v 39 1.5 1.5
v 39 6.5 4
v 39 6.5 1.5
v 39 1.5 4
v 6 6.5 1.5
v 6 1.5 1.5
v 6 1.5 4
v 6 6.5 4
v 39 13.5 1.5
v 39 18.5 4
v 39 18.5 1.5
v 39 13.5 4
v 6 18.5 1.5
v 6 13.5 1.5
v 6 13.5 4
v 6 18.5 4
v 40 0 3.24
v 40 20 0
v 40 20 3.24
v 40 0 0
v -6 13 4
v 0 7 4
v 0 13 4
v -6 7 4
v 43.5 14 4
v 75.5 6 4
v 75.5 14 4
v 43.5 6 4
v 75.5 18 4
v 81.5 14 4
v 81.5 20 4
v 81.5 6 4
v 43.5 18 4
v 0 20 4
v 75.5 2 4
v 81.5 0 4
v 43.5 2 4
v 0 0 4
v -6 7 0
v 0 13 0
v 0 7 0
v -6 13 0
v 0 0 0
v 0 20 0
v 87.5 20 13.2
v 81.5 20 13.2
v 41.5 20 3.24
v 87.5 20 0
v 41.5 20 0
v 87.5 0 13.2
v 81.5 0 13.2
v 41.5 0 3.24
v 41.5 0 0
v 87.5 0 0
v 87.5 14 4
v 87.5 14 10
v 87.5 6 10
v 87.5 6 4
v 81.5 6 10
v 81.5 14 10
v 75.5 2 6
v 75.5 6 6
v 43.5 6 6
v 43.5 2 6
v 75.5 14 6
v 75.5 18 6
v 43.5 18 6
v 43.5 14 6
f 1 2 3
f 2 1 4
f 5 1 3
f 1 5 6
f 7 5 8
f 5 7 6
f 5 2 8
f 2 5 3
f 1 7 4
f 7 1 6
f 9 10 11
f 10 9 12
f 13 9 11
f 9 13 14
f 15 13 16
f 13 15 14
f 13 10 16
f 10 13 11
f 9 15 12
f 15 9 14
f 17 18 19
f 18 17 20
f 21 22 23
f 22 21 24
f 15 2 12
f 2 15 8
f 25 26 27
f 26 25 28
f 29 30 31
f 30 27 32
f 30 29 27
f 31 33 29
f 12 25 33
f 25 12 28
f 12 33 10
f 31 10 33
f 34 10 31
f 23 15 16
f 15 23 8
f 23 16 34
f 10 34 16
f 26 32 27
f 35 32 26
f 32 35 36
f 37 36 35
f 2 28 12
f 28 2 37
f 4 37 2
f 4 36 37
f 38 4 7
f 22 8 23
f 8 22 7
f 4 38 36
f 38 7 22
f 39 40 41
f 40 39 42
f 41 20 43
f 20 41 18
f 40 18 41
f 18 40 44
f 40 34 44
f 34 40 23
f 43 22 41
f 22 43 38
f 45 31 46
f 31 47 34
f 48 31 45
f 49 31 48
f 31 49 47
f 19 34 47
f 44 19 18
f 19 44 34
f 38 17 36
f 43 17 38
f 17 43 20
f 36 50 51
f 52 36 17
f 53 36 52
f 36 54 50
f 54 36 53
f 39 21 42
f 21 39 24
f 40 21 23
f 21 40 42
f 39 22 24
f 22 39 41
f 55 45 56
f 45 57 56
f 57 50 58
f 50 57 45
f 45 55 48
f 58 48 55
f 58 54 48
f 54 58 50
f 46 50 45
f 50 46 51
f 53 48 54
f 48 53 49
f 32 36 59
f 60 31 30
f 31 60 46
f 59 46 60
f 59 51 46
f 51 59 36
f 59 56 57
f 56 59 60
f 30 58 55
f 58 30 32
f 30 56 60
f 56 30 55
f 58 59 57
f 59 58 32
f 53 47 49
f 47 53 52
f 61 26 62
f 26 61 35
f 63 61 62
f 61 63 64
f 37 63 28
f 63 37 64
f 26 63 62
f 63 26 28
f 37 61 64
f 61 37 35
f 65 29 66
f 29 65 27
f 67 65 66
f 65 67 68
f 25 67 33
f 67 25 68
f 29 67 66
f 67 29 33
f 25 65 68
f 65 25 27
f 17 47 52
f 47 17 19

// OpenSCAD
//distance between parts
distb = 1.5;

//length of part
le = 40;

//width of part
wi = 20;

//height of top part
he = 4;

//ridge height
rihe = 2;

//ridge width
riwi = 4;

//padding
p = 1;

//give between ridges and holes
g = .5;

//connection height
cohe = .76;

//thingy length
thle = 6;

//thingy width
thwi = 6;

//fastener give
fagi = 1.0;

//ridge dist from fastener
ridi = 5;


module top()
{

  difference()
  {
    cube([le,wi,he]);

    //ridge holes
    union()
    {
      translate([p+ridi,2*p-g,he-rihe-g])
      cube([le-2*p-ridi,riwi+2*g,he+1]);

      translate([p+ridi,wi-2*p-g-riwi,he-rihe-g])
      cube([le-2*p-ridi,riwi+2*g,he+1]);
    }
  }

//fastener thingy
translate([-thle,wi/2-thwi/2,0])
cube([thle,thwi,he]);

}

module bottom()
{
translate([distb+le,0,0])
cube([le,wi,he]);

//ridges
translate([distb+le+p+2*g,2*p,he])
cube([le-2*p-2*g-ridi,riwi,rihe]);

translate([distb+le+p+2*g,wi-riwi-2*p,he])
cube([le-2*p-2*g-ridi,riwi,rihe]);


//fastener thingy
difference()
{
  translate([2*le+distb,0,0])
  cube([thle,wi,he*3.3]);

  translate([2*le+distb-1,wi/2-thwi/2-fagi,he])
  cube([thle*2,thwi+2*fagi,he+2*fagi]);
}
}

module connection()
{
  translate([le,0,he-cohe])
  cube([2,wi,cohe]);
}

top();
bottom();
connection();
